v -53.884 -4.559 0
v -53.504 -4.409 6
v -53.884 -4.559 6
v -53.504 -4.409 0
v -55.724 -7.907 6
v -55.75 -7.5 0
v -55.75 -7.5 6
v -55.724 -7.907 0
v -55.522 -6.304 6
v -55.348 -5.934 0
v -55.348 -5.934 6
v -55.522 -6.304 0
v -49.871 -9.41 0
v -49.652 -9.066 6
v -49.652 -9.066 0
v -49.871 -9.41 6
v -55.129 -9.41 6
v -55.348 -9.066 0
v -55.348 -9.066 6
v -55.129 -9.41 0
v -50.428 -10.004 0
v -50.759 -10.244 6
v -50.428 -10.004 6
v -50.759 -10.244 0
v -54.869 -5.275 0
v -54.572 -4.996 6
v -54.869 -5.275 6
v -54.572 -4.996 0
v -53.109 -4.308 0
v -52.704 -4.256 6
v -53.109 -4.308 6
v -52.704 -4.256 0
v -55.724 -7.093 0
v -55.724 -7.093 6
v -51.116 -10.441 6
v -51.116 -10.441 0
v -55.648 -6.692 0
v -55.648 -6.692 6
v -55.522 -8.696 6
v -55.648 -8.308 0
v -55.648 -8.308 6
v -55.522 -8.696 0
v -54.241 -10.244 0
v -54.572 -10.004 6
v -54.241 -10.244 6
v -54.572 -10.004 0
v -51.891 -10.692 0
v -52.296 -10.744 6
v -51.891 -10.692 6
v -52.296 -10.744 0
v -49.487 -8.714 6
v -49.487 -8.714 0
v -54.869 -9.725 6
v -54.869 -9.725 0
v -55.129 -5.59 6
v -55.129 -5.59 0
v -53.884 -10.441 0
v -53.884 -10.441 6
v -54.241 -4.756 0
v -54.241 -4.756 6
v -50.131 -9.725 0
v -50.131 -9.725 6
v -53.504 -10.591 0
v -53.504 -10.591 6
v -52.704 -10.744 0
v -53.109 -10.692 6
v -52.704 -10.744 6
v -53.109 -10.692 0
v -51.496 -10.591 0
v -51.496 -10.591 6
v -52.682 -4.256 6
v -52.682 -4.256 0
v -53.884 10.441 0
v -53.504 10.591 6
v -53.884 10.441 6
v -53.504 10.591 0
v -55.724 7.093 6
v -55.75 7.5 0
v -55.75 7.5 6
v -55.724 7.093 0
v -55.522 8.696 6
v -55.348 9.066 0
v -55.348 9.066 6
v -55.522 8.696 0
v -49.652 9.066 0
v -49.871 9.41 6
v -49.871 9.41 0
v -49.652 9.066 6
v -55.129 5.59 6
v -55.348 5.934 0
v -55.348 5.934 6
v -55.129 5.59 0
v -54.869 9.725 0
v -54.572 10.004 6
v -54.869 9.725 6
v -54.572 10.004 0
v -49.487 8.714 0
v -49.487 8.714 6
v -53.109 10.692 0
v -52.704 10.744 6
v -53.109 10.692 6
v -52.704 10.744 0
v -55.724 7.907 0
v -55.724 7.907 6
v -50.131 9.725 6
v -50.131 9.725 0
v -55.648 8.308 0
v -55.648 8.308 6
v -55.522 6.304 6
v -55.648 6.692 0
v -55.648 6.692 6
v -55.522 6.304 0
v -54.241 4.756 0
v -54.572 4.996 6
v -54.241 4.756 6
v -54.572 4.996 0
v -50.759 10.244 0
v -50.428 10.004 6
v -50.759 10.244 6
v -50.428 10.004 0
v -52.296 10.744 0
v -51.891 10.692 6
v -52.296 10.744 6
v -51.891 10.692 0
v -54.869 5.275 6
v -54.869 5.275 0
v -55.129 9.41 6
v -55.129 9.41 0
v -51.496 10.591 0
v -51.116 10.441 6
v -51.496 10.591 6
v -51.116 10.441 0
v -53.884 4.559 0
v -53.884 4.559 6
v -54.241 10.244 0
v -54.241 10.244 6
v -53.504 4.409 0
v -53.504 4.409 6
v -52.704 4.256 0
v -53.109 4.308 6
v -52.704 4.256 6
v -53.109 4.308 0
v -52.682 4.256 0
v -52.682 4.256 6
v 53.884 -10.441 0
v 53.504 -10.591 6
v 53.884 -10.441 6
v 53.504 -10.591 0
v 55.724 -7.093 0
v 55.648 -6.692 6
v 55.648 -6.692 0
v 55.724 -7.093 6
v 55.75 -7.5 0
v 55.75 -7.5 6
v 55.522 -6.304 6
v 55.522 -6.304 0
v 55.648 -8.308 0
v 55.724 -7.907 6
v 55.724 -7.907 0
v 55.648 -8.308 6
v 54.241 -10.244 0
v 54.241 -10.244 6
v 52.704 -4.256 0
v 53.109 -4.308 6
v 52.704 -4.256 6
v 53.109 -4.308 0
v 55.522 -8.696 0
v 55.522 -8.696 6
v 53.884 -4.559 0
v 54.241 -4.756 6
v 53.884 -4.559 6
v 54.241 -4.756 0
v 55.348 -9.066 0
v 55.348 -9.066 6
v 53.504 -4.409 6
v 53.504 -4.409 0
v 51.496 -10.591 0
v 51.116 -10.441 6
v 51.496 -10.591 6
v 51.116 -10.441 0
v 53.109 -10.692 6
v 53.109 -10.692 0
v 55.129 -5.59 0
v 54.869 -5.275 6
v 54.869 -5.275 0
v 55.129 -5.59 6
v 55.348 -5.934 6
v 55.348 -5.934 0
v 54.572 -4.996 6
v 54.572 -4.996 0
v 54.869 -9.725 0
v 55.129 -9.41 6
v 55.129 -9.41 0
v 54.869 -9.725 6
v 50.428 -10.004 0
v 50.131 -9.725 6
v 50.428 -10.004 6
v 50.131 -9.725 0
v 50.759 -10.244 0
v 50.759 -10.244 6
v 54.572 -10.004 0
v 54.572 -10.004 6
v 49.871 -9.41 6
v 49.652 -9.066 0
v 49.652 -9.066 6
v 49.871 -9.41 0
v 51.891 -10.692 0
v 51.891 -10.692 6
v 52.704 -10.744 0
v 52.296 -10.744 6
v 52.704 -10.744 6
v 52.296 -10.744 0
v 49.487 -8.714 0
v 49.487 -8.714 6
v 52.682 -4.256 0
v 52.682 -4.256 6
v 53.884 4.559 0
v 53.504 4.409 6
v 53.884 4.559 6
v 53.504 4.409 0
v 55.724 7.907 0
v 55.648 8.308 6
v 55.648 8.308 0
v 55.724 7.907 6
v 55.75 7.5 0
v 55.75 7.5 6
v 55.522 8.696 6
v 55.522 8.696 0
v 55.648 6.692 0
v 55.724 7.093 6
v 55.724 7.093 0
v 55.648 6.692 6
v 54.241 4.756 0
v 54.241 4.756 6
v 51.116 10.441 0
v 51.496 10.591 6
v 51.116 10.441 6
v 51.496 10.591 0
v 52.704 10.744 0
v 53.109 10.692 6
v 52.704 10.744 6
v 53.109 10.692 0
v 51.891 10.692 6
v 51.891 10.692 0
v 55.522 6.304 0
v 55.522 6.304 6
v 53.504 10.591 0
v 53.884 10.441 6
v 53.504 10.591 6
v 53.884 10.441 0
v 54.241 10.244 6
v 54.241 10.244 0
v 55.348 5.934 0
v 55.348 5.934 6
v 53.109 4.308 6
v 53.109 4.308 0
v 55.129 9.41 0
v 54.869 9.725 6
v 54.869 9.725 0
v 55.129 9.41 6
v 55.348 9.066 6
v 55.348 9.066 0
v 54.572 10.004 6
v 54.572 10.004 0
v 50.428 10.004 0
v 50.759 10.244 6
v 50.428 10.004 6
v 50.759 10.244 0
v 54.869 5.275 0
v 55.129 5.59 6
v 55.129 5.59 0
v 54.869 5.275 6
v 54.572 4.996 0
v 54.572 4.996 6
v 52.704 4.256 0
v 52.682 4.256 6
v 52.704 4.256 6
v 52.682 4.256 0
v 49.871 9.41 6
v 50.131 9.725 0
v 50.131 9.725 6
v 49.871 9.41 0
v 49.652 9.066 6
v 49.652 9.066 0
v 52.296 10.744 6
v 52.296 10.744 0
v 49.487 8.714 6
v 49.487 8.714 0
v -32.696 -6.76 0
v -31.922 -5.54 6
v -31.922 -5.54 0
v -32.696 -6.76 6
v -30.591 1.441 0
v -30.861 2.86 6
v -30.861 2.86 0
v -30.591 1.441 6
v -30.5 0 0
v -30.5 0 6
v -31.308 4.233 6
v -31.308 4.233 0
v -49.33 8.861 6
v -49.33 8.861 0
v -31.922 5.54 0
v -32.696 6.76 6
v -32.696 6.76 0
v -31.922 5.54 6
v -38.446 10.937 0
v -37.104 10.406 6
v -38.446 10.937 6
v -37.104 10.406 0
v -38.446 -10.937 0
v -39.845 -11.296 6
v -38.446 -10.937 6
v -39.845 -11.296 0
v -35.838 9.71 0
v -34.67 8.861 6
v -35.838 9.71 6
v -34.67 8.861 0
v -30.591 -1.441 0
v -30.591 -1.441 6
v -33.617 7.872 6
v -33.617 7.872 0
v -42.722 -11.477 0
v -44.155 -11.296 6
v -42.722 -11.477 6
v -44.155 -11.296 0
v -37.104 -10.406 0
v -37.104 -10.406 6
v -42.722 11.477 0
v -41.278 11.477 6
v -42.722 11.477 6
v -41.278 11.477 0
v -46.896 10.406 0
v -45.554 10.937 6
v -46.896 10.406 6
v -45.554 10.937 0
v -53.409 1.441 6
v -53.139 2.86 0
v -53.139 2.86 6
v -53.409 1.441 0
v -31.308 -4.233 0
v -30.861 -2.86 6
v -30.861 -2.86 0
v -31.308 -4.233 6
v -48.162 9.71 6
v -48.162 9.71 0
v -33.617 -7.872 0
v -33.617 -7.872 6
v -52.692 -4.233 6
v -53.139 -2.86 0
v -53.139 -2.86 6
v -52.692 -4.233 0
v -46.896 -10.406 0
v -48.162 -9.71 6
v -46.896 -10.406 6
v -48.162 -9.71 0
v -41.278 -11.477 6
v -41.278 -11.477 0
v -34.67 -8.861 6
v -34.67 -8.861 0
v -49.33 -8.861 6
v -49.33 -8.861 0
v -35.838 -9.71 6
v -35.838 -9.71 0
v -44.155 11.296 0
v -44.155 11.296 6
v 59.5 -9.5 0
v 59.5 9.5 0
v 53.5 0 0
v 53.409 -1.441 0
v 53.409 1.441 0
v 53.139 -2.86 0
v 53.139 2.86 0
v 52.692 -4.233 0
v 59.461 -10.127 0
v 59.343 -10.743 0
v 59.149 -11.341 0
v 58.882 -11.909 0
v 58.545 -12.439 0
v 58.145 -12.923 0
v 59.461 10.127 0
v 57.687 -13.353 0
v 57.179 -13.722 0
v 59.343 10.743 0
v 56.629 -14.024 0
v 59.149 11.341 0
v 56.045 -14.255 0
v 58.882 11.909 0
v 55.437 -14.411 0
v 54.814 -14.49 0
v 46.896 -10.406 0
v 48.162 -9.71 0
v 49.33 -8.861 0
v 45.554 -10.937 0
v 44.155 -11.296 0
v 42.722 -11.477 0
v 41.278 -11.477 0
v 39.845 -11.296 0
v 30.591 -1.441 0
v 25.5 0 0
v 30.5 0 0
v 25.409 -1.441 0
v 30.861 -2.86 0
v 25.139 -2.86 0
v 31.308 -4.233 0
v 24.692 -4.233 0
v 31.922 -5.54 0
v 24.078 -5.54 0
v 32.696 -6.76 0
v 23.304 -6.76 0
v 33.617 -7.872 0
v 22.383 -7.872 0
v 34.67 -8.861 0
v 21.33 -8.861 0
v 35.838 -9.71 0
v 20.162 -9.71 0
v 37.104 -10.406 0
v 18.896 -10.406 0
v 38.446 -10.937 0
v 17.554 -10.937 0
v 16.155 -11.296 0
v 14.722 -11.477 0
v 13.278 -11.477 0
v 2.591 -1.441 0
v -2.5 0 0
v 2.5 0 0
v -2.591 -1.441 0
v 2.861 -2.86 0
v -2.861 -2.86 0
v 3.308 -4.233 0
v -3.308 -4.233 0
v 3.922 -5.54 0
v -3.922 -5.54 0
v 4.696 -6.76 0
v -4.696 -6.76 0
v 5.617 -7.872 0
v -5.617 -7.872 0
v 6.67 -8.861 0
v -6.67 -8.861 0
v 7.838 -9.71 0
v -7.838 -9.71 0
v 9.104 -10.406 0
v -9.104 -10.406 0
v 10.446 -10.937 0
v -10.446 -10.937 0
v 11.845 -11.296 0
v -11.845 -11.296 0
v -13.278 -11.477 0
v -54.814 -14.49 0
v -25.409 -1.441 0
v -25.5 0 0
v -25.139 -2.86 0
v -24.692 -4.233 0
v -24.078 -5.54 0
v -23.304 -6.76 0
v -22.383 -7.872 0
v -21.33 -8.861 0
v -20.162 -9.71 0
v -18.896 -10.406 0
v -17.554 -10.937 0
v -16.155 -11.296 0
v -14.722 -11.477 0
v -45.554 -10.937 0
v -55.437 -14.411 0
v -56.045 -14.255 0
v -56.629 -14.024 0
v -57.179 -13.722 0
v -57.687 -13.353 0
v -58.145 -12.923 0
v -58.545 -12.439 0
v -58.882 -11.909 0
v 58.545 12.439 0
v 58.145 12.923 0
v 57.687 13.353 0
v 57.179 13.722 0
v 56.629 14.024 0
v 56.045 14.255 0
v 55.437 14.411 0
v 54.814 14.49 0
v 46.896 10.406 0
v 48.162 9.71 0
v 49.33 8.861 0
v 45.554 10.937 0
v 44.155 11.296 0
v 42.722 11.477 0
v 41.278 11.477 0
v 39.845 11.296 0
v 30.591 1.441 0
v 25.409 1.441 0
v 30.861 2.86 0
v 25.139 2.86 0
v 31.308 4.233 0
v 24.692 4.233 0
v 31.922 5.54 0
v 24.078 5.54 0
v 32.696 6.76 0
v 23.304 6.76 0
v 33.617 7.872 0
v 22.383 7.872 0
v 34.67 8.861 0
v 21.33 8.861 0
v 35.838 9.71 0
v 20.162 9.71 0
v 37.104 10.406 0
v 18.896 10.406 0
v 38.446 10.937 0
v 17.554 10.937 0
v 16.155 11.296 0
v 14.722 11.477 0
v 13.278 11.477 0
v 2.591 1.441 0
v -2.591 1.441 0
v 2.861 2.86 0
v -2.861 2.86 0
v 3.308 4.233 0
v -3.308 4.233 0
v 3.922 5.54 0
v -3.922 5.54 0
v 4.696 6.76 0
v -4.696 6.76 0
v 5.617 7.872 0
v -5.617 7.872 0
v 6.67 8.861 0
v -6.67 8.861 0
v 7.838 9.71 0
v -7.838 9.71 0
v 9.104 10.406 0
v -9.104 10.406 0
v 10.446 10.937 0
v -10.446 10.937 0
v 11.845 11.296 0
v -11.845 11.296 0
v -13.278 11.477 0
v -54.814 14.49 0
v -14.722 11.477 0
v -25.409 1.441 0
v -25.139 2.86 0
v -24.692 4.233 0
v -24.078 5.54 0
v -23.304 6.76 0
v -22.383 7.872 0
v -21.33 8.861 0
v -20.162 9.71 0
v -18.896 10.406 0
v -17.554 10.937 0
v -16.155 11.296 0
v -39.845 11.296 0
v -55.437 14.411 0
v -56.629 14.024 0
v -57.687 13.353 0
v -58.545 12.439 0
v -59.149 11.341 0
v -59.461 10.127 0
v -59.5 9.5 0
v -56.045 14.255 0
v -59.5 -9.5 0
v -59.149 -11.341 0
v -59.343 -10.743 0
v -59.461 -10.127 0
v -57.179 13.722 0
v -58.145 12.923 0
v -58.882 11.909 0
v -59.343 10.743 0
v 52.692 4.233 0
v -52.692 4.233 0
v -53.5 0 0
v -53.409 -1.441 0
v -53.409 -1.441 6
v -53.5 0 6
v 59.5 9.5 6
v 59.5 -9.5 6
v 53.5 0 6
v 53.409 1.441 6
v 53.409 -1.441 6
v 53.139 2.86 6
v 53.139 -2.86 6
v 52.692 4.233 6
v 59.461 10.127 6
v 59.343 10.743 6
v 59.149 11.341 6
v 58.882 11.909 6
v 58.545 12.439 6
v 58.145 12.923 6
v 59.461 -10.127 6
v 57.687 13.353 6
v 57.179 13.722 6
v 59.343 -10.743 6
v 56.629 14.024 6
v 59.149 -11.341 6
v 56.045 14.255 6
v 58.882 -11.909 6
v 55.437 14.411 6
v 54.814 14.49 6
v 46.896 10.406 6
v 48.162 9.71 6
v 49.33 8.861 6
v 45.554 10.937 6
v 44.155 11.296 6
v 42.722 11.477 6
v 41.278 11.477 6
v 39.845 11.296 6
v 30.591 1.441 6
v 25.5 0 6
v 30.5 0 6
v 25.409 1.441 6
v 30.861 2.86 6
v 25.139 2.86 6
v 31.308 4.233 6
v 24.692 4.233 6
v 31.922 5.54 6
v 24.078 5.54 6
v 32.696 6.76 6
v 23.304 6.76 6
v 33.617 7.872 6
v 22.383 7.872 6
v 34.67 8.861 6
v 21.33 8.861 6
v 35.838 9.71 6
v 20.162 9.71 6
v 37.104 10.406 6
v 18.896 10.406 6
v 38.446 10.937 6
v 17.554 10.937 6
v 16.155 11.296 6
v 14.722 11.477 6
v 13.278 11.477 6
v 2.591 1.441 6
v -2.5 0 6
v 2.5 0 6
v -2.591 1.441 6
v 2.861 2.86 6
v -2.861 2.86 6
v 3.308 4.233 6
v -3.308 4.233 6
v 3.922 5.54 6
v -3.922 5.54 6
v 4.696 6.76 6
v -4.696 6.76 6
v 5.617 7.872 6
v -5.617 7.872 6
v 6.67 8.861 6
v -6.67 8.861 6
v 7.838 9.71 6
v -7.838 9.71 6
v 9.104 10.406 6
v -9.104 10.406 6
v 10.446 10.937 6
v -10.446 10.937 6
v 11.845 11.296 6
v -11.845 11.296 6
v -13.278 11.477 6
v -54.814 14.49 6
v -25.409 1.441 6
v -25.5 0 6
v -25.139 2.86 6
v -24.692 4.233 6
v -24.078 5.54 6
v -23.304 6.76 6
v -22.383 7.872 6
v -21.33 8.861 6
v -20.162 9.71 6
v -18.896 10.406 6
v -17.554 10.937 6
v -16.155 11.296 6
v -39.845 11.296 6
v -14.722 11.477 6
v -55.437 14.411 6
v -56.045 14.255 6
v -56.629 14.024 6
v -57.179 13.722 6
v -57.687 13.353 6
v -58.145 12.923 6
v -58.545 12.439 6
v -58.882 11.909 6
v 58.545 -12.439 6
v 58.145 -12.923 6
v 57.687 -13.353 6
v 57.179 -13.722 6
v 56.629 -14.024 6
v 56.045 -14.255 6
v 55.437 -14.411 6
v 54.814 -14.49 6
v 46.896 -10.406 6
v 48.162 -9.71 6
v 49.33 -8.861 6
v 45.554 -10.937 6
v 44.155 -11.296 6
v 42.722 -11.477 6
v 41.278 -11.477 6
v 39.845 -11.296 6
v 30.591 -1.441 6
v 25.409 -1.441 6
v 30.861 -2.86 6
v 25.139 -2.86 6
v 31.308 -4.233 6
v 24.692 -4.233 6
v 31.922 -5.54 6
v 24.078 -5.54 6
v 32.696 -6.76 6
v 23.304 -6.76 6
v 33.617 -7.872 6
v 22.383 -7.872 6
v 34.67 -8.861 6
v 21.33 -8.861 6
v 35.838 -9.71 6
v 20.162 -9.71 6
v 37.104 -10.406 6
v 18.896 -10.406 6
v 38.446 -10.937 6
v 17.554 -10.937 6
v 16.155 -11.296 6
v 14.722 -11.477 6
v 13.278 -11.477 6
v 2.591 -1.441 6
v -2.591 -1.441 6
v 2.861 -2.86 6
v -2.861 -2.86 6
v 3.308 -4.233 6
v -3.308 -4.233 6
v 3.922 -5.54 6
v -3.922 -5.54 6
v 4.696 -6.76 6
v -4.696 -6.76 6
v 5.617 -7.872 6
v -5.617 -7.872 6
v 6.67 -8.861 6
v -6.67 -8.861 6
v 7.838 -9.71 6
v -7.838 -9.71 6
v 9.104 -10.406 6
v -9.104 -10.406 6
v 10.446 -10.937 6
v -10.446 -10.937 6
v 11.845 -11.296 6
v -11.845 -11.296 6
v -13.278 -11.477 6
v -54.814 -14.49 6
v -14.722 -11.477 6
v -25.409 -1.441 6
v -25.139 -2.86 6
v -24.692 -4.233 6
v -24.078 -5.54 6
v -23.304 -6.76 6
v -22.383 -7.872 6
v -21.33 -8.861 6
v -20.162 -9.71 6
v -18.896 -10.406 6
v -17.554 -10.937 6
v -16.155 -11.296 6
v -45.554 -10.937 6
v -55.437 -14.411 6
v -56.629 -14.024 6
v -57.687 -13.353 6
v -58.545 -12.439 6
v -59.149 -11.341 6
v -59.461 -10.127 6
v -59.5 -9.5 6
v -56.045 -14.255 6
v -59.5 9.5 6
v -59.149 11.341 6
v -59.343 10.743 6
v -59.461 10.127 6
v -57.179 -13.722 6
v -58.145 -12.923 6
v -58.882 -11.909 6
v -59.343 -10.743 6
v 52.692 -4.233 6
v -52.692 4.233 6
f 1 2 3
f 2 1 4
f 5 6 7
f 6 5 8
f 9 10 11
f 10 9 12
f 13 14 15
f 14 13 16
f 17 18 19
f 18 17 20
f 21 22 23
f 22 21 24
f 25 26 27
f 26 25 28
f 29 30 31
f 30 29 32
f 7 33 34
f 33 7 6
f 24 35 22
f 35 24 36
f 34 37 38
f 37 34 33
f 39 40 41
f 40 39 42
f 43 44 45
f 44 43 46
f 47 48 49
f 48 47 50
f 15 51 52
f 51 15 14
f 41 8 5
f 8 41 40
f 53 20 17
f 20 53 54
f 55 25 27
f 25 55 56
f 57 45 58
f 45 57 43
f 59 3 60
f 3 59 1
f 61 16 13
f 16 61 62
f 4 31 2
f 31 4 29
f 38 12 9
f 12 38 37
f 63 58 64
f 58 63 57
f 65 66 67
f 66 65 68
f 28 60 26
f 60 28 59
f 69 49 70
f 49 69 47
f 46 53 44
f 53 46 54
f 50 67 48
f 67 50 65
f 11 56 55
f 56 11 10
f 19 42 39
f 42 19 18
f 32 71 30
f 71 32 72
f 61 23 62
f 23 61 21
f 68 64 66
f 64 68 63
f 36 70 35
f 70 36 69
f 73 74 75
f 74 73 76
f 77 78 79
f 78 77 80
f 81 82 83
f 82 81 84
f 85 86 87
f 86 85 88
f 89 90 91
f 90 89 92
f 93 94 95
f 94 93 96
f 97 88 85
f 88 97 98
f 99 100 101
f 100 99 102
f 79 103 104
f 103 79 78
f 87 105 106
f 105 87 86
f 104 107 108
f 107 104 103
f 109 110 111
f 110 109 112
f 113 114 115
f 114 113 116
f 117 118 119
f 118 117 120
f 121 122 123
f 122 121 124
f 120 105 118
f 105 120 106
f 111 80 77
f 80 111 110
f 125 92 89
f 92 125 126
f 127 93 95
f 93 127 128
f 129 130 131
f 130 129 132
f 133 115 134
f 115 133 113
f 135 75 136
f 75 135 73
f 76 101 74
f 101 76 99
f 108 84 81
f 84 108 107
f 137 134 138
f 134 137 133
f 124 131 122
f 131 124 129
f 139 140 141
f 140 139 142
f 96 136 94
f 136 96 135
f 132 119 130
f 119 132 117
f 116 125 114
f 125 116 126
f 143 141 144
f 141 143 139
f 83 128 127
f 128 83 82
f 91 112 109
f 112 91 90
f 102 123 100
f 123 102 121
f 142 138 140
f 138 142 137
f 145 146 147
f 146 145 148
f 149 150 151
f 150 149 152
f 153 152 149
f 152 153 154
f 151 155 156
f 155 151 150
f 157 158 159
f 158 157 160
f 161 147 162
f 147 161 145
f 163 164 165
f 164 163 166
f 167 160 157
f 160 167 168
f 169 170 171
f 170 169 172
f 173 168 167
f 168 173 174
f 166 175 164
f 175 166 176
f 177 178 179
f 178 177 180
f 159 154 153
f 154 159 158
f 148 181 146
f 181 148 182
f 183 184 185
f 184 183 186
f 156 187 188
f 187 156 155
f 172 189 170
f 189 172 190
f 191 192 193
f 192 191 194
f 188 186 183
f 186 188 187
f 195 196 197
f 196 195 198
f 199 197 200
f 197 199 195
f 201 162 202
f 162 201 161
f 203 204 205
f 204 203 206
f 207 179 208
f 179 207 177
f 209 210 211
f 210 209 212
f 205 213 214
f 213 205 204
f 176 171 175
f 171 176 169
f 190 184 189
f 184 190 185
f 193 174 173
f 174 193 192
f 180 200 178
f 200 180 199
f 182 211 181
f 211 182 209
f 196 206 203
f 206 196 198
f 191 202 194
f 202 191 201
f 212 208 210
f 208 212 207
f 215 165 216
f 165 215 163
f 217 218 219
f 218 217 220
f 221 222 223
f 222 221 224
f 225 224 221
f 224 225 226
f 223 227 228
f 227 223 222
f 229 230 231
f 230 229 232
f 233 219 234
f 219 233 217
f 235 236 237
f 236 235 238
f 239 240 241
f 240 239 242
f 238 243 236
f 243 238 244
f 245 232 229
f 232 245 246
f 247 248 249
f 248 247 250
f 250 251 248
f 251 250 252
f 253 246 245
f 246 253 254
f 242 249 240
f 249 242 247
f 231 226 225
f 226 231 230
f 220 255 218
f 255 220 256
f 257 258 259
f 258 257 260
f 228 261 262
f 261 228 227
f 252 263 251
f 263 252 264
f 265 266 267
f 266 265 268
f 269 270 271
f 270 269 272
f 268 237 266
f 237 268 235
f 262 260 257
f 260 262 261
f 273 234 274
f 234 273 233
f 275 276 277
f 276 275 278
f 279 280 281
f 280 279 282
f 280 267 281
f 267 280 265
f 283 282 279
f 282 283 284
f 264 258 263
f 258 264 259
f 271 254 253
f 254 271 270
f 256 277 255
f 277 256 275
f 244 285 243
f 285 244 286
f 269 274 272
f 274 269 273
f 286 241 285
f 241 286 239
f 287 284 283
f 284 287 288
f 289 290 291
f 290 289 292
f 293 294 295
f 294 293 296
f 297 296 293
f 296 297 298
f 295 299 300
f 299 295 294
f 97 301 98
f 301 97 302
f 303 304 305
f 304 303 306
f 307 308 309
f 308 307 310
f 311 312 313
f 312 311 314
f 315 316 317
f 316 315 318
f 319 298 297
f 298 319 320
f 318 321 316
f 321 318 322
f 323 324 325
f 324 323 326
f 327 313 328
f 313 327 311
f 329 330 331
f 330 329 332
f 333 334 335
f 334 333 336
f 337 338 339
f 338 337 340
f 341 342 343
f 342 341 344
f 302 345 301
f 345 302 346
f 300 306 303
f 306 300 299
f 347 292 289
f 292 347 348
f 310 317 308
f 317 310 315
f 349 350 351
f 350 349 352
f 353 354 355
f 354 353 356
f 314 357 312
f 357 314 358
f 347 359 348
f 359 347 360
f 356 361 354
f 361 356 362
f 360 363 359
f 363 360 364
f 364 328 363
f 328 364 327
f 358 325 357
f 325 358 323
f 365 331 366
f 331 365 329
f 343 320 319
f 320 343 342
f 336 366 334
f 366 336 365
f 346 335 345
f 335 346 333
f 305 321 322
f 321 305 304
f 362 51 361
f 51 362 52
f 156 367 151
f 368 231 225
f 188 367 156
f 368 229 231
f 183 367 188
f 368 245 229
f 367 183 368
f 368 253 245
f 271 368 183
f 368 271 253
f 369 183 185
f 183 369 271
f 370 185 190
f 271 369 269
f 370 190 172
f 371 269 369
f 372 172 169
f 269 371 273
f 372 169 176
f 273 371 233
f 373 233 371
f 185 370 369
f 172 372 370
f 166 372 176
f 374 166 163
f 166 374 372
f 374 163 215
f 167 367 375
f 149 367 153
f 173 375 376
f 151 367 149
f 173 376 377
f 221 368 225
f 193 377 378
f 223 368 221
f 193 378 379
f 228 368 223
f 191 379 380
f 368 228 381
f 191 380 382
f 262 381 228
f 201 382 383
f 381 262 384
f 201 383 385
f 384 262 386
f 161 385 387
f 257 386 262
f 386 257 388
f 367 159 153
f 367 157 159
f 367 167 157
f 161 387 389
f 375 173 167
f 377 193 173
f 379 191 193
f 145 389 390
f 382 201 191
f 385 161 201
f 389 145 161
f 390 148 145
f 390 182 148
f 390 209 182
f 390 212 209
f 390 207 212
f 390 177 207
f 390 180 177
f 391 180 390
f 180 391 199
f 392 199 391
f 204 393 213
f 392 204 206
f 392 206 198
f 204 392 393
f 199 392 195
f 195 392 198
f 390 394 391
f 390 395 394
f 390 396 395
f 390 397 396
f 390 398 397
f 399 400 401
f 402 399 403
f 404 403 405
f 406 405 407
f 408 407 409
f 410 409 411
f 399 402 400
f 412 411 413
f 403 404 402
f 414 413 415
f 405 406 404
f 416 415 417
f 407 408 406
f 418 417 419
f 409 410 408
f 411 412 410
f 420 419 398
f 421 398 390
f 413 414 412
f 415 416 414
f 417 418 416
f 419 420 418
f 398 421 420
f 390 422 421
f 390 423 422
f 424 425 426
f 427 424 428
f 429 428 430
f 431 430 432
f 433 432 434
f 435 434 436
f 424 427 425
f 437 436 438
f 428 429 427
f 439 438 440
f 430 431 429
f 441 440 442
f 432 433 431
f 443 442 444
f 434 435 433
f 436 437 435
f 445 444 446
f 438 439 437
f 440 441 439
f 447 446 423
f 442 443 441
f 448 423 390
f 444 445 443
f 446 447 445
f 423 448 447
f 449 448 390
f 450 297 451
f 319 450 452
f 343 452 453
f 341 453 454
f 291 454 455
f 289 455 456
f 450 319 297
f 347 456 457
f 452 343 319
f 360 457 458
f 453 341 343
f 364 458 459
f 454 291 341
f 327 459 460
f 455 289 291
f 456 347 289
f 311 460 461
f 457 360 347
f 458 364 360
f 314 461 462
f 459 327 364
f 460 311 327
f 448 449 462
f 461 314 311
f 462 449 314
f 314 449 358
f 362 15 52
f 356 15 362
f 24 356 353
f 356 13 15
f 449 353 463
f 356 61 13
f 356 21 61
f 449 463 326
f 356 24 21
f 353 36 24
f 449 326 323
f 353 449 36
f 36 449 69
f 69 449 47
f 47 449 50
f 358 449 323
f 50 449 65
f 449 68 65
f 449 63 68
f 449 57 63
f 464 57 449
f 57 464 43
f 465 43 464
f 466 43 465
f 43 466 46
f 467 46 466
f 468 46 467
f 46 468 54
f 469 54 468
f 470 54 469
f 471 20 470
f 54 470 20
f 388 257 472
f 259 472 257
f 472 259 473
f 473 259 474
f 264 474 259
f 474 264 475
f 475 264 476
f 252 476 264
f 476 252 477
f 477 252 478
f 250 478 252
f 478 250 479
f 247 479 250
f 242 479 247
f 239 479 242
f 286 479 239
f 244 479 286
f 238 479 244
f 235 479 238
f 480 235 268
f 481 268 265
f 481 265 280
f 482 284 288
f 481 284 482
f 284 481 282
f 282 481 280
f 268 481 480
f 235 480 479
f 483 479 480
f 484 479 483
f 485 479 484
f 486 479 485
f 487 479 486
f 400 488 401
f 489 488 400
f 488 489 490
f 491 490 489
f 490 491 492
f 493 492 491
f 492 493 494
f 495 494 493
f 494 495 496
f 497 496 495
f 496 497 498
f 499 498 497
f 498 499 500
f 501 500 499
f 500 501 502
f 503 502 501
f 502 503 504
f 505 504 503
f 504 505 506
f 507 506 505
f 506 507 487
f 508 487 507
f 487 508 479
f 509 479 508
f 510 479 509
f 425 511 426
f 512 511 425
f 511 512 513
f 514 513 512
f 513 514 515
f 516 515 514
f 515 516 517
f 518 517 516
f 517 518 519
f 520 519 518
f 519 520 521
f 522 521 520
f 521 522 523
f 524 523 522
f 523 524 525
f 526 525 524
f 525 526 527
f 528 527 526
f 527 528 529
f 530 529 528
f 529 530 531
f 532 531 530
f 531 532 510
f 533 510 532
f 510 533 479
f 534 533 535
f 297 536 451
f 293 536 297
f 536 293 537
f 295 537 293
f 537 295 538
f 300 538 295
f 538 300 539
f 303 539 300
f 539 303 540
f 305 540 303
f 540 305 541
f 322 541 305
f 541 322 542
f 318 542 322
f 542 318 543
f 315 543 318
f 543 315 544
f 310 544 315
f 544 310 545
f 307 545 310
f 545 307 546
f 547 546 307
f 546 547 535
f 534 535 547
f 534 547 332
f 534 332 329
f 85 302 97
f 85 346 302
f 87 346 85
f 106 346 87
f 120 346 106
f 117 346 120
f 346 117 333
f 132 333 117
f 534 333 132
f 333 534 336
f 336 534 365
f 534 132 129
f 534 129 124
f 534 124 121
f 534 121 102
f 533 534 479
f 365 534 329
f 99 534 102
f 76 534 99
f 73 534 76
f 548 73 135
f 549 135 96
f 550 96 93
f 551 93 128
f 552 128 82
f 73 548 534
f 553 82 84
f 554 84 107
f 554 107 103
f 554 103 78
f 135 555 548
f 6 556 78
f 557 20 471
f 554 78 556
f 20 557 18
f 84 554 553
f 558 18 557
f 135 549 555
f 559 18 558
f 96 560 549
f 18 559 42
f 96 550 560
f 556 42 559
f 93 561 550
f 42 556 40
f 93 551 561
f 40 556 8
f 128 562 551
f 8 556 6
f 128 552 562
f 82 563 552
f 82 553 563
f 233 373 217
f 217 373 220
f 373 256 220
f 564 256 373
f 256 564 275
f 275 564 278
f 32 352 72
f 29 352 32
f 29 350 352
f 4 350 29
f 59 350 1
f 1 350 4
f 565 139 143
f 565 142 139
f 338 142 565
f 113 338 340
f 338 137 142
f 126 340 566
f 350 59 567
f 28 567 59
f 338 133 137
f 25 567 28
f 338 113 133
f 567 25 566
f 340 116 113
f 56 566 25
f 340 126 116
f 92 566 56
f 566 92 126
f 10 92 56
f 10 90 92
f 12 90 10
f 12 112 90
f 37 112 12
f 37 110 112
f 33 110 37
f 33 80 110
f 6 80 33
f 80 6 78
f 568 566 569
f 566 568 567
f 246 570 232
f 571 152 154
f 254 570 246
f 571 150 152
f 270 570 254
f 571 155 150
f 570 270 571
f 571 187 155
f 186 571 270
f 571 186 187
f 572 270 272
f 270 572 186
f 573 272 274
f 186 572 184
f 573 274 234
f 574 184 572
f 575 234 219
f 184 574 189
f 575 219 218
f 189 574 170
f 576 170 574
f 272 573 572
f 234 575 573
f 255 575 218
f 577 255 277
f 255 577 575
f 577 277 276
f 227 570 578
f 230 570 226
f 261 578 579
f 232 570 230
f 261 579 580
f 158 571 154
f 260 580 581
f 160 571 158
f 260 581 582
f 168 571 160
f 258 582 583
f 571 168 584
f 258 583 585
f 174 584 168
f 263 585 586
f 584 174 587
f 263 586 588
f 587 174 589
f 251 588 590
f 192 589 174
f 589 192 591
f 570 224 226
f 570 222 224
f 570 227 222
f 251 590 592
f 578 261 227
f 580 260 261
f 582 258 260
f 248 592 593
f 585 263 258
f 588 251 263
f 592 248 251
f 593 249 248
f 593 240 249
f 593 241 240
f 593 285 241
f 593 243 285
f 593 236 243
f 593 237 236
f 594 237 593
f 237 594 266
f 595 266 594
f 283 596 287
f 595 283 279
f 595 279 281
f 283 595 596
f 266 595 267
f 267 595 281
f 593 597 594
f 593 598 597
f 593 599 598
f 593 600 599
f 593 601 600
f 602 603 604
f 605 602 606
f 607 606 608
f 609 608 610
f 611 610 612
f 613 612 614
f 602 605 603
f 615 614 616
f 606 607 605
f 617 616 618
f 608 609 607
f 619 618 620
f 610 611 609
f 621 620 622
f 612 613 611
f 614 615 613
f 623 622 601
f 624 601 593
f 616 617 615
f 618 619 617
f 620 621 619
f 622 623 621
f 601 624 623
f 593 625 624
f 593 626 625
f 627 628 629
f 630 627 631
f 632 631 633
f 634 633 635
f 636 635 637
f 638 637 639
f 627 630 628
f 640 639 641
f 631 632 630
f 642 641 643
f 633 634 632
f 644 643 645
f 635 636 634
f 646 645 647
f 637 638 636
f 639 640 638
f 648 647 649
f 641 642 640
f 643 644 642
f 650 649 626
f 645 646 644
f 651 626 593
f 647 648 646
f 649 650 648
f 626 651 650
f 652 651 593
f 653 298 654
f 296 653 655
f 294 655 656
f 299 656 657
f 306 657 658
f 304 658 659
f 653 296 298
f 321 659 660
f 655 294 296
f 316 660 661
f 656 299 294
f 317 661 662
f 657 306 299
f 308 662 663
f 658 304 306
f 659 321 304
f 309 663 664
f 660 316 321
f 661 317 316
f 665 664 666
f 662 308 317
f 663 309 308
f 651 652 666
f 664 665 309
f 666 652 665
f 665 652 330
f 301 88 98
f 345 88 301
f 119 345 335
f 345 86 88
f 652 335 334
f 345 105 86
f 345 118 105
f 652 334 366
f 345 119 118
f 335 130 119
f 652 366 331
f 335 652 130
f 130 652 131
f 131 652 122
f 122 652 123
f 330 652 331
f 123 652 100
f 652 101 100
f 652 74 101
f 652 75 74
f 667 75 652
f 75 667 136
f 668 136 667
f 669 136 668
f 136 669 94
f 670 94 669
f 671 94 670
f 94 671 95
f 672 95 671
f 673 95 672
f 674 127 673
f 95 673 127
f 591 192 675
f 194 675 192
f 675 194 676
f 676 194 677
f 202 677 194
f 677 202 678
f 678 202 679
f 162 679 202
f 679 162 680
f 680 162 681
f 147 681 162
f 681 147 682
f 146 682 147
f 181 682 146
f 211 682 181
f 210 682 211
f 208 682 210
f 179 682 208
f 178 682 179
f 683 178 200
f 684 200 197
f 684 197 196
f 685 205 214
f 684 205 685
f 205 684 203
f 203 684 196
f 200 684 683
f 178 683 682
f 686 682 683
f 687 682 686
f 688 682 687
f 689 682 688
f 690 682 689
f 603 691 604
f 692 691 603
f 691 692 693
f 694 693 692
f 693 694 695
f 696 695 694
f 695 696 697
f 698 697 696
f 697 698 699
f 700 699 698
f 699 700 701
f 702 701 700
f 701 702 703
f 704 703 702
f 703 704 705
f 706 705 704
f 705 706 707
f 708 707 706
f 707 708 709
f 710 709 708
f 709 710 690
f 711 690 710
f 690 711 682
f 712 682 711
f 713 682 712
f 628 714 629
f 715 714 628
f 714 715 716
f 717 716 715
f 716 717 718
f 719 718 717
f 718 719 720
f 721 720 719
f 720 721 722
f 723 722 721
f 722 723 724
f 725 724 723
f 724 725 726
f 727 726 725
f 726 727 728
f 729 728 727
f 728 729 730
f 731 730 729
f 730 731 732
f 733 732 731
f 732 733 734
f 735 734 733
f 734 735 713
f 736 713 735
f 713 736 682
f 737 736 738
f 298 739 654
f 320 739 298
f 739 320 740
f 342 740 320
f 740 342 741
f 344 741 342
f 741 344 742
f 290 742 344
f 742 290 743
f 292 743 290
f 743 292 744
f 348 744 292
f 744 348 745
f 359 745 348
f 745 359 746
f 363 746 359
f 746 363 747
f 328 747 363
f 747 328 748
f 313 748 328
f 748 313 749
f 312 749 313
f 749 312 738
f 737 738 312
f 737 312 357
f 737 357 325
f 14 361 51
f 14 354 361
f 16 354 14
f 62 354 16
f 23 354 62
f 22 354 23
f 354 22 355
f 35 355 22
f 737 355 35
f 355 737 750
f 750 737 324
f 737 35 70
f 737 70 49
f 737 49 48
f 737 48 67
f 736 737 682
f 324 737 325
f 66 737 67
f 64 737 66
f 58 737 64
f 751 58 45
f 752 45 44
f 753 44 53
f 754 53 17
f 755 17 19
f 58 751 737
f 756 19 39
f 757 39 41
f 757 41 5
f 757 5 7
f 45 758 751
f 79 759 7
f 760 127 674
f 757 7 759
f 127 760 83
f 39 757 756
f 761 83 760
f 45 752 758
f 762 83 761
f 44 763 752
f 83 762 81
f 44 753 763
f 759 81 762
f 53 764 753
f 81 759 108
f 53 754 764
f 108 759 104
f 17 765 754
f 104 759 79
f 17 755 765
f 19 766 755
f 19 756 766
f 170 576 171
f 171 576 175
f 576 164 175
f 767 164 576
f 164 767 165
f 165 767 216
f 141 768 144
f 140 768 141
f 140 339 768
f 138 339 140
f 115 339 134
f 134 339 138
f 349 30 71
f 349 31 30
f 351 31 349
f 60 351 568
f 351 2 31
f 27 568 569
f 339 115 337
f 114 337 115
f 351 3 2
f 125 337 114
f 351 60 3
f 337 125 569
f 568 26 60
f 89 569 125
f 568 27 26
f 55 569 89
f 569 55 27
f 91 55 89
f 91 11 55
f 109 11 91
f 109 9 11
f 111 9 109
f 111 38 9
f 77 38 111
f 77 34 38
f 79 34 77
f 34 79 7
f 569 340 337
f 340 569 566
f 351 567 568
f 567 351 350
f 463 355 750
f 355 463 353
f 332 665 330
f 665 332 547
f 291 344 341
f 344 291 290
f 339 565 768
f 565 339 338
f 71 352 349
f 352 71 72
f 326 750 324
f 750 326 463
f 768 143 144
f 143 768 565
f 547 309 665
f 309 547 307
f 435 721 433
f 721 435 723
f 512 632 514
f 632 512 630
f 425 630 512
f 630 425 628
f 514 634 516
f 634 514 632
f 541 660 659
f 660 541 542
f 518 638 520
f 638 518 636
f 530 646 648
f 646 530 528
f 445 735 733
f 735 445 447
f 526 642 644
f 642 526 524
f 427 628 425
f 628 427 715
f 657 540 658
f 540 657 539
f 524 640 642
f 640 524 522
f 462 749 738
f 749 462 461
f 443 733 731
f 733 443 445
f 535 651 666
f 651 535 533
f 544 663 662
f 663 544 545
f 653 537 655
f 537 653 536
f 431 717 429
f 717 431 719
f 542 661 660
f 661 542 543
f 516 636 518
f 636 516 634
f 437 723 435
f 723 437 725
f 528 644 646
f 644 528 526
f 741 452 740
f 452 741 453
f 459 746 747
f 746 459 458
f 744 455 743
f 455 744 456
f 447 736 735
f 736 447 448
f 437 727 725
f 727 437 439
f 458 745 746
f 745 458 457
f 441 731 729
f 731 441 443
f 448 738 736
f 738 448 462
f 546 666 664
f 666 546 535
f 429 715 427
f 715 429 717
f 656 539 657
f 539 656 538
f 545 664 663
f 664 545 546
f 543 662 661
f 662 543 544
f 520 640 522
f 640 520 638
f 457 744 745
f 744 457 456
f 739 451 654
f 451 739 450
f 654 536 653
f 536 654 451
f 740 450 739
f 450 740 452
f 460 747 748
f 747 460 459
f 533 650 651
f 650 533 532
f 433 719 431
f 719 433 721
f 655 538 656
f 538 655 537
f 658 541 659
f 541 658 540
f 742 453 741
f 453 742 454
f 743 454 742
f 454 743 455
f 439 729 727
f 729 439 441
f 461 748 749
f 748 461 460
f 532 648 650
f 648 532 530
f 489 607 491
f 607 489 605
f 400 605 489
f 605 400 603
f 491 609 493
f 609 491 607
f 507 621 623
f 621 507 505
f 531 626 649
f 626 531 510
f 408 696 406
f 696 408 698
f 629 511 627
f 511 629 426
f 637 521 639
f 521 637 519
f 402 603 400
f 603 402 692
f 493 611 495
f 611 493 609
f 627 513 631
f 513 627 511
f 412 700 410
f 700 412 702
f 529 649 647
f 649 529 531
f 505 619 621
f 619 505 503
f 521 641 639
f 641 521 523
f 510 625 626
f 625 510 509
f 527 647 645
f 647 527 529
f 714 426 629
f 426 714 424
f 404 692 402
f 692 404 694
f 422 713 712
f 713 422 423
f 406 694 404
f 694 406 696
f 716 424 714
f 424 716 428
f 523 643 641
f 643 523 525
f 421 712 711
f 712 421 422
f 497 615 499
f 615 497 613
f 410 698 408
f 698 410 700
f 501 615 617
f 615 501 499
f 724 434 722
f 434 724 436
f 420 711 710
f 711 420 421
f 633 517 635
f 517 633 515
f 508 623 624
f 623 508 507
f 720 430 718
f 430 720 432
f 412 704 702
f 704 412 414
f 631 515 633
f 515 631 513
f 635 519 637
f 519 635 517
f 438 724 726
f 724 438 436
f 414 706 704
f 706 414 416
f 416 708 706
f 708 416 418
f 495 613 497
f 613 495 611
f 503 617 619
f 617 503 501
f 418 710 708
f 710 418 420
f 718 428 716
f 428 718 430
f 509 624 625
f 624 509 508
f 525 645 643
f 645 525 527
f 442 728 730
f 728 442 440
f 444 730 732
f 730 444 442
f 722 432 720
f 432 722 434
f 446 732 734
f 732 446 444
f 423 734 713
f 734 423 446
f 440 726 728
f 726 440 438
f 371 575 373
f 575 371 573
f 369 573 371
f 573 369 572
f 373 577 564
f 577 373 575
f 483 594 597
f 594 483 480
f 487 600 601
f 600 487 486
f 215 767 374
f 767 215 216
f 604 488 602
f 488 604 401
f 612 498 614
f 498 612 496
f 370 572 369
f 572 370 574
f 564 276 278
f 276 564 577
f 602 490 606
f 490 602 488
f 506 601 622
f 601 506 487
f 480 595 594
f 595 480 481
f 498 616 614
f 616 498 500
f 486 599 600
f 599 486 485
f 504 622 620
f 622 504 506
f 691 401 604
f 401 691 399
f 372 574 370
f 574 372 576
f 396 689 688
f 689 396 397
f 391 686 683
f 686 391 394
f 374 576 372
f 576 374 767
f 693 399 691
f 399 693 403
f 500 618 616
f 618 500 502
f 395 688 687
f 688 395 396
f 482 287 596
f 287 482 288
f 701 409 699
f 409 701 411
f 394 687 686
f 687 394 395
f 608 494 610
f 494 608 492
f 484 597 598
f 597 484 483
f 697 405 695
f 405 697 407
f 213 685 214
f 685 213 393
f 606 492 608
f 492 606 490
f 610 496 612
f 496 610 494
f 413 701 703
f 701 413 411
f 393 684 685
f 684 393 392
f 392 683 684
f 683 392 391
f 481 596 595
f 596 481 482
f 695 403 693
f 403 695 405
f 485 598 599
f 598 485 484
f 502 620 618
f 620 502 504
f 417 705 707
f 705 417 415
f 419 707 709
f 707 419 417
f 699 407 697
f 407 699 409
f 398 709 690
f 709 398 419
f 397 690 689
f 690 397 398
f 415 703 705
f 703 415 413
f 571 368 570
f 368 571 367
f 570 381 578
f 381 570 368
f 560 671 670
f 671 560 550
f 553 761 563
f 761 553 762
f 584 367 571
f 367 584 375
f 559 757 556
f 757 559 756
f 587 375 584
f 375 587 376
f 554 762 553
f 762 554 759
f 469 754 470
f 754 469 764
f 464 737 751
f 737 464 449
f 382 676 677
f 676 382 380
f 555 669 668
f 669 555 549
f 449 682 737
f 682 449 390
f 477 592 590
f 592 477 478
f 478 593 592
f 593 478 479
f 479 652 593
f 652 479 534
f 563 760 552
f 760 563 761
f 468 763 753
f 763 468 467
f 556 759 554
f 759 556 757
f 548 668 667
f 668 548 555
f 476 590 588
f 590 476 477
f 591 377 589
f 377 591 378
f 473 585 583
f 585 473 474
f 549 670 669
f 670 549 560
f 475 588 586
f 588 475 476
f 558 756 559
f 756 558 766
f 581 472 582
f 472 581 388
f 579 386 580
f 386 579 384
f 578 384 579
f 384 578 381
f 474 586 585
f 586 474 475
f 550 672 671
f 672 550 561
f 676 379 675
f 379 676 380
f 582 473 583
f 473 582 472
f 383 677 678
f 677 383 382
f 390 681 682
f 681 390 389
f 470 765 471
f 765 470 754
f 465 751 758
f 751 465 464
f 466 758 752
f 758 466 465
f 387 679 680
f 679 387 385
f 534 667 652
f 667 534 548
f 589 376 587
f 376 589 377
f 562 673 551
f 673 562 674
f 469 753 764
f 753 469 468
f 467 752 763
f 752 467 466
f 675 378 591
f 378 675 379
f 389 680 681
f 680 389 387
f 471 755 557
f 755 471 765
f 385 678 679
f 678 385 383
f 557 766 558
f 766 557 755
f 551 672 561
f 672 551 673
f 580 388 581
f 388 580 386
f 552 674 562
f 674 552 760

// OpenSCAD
$fn = 50;


difference() {
	union() {
		hull() {
			translate(v = [-54.5000000000, 9.5000000000, 0]) {
				cylinder(h = 6, r = 5);
			}
			translate(v = [54.5000000000, 9.5000000000, 0]) {
				cylinder(h = 6, r = 5);
			}
			translate(v = [-54.5000000000, -9.5000000000, 0]) {
				cylinder(h = 6, r = 5);
			}
			translate(v = [54.5000000000, -9.5000000000, 0]) {
				cylinder(h = 6, r = 5);
			}
		}
	}
	union() {
		#translate(v = [-52.5000000000, -7.5000000000, -100.0000000000]) {
			cylinder(h = 200, r = 3.2500000000);
		}
		#translate(v = [-52.5000000000, 7.5000000000, -100.0000000000]) {
			cylinder(h = 200, r = 3.2500000000);
		}
		#translate(v = [52.5000000000, -7.5000000000, -100.0000000000]) {
			cylinder(h = 200, r = 3.2500000000);
		}
		#translate(v = [52.5000000000, 7.5000000000, -100.0000000000]) {
			cylinder(h = 200, r = 3.2500000000);
		}
		#translate(v = [-42.0000000000, 0, 0]) {
			cylinder(h = 6, r = 11.5000000000);
		}
		#translate(v = [-14.0000000000, 0, 0]) {
			cylinder(h = 6, r = 11.5000000000);
		}
		#translate(v = [14.0000000000, 0, 0]) {
			cylinder(h = 6, r = 11.5000000000);
		}
		#translate(v = [42.0000000000, 0, 0]) {
			cylinder(h = 6, r = 11.5000000000);
		}
	}
}
